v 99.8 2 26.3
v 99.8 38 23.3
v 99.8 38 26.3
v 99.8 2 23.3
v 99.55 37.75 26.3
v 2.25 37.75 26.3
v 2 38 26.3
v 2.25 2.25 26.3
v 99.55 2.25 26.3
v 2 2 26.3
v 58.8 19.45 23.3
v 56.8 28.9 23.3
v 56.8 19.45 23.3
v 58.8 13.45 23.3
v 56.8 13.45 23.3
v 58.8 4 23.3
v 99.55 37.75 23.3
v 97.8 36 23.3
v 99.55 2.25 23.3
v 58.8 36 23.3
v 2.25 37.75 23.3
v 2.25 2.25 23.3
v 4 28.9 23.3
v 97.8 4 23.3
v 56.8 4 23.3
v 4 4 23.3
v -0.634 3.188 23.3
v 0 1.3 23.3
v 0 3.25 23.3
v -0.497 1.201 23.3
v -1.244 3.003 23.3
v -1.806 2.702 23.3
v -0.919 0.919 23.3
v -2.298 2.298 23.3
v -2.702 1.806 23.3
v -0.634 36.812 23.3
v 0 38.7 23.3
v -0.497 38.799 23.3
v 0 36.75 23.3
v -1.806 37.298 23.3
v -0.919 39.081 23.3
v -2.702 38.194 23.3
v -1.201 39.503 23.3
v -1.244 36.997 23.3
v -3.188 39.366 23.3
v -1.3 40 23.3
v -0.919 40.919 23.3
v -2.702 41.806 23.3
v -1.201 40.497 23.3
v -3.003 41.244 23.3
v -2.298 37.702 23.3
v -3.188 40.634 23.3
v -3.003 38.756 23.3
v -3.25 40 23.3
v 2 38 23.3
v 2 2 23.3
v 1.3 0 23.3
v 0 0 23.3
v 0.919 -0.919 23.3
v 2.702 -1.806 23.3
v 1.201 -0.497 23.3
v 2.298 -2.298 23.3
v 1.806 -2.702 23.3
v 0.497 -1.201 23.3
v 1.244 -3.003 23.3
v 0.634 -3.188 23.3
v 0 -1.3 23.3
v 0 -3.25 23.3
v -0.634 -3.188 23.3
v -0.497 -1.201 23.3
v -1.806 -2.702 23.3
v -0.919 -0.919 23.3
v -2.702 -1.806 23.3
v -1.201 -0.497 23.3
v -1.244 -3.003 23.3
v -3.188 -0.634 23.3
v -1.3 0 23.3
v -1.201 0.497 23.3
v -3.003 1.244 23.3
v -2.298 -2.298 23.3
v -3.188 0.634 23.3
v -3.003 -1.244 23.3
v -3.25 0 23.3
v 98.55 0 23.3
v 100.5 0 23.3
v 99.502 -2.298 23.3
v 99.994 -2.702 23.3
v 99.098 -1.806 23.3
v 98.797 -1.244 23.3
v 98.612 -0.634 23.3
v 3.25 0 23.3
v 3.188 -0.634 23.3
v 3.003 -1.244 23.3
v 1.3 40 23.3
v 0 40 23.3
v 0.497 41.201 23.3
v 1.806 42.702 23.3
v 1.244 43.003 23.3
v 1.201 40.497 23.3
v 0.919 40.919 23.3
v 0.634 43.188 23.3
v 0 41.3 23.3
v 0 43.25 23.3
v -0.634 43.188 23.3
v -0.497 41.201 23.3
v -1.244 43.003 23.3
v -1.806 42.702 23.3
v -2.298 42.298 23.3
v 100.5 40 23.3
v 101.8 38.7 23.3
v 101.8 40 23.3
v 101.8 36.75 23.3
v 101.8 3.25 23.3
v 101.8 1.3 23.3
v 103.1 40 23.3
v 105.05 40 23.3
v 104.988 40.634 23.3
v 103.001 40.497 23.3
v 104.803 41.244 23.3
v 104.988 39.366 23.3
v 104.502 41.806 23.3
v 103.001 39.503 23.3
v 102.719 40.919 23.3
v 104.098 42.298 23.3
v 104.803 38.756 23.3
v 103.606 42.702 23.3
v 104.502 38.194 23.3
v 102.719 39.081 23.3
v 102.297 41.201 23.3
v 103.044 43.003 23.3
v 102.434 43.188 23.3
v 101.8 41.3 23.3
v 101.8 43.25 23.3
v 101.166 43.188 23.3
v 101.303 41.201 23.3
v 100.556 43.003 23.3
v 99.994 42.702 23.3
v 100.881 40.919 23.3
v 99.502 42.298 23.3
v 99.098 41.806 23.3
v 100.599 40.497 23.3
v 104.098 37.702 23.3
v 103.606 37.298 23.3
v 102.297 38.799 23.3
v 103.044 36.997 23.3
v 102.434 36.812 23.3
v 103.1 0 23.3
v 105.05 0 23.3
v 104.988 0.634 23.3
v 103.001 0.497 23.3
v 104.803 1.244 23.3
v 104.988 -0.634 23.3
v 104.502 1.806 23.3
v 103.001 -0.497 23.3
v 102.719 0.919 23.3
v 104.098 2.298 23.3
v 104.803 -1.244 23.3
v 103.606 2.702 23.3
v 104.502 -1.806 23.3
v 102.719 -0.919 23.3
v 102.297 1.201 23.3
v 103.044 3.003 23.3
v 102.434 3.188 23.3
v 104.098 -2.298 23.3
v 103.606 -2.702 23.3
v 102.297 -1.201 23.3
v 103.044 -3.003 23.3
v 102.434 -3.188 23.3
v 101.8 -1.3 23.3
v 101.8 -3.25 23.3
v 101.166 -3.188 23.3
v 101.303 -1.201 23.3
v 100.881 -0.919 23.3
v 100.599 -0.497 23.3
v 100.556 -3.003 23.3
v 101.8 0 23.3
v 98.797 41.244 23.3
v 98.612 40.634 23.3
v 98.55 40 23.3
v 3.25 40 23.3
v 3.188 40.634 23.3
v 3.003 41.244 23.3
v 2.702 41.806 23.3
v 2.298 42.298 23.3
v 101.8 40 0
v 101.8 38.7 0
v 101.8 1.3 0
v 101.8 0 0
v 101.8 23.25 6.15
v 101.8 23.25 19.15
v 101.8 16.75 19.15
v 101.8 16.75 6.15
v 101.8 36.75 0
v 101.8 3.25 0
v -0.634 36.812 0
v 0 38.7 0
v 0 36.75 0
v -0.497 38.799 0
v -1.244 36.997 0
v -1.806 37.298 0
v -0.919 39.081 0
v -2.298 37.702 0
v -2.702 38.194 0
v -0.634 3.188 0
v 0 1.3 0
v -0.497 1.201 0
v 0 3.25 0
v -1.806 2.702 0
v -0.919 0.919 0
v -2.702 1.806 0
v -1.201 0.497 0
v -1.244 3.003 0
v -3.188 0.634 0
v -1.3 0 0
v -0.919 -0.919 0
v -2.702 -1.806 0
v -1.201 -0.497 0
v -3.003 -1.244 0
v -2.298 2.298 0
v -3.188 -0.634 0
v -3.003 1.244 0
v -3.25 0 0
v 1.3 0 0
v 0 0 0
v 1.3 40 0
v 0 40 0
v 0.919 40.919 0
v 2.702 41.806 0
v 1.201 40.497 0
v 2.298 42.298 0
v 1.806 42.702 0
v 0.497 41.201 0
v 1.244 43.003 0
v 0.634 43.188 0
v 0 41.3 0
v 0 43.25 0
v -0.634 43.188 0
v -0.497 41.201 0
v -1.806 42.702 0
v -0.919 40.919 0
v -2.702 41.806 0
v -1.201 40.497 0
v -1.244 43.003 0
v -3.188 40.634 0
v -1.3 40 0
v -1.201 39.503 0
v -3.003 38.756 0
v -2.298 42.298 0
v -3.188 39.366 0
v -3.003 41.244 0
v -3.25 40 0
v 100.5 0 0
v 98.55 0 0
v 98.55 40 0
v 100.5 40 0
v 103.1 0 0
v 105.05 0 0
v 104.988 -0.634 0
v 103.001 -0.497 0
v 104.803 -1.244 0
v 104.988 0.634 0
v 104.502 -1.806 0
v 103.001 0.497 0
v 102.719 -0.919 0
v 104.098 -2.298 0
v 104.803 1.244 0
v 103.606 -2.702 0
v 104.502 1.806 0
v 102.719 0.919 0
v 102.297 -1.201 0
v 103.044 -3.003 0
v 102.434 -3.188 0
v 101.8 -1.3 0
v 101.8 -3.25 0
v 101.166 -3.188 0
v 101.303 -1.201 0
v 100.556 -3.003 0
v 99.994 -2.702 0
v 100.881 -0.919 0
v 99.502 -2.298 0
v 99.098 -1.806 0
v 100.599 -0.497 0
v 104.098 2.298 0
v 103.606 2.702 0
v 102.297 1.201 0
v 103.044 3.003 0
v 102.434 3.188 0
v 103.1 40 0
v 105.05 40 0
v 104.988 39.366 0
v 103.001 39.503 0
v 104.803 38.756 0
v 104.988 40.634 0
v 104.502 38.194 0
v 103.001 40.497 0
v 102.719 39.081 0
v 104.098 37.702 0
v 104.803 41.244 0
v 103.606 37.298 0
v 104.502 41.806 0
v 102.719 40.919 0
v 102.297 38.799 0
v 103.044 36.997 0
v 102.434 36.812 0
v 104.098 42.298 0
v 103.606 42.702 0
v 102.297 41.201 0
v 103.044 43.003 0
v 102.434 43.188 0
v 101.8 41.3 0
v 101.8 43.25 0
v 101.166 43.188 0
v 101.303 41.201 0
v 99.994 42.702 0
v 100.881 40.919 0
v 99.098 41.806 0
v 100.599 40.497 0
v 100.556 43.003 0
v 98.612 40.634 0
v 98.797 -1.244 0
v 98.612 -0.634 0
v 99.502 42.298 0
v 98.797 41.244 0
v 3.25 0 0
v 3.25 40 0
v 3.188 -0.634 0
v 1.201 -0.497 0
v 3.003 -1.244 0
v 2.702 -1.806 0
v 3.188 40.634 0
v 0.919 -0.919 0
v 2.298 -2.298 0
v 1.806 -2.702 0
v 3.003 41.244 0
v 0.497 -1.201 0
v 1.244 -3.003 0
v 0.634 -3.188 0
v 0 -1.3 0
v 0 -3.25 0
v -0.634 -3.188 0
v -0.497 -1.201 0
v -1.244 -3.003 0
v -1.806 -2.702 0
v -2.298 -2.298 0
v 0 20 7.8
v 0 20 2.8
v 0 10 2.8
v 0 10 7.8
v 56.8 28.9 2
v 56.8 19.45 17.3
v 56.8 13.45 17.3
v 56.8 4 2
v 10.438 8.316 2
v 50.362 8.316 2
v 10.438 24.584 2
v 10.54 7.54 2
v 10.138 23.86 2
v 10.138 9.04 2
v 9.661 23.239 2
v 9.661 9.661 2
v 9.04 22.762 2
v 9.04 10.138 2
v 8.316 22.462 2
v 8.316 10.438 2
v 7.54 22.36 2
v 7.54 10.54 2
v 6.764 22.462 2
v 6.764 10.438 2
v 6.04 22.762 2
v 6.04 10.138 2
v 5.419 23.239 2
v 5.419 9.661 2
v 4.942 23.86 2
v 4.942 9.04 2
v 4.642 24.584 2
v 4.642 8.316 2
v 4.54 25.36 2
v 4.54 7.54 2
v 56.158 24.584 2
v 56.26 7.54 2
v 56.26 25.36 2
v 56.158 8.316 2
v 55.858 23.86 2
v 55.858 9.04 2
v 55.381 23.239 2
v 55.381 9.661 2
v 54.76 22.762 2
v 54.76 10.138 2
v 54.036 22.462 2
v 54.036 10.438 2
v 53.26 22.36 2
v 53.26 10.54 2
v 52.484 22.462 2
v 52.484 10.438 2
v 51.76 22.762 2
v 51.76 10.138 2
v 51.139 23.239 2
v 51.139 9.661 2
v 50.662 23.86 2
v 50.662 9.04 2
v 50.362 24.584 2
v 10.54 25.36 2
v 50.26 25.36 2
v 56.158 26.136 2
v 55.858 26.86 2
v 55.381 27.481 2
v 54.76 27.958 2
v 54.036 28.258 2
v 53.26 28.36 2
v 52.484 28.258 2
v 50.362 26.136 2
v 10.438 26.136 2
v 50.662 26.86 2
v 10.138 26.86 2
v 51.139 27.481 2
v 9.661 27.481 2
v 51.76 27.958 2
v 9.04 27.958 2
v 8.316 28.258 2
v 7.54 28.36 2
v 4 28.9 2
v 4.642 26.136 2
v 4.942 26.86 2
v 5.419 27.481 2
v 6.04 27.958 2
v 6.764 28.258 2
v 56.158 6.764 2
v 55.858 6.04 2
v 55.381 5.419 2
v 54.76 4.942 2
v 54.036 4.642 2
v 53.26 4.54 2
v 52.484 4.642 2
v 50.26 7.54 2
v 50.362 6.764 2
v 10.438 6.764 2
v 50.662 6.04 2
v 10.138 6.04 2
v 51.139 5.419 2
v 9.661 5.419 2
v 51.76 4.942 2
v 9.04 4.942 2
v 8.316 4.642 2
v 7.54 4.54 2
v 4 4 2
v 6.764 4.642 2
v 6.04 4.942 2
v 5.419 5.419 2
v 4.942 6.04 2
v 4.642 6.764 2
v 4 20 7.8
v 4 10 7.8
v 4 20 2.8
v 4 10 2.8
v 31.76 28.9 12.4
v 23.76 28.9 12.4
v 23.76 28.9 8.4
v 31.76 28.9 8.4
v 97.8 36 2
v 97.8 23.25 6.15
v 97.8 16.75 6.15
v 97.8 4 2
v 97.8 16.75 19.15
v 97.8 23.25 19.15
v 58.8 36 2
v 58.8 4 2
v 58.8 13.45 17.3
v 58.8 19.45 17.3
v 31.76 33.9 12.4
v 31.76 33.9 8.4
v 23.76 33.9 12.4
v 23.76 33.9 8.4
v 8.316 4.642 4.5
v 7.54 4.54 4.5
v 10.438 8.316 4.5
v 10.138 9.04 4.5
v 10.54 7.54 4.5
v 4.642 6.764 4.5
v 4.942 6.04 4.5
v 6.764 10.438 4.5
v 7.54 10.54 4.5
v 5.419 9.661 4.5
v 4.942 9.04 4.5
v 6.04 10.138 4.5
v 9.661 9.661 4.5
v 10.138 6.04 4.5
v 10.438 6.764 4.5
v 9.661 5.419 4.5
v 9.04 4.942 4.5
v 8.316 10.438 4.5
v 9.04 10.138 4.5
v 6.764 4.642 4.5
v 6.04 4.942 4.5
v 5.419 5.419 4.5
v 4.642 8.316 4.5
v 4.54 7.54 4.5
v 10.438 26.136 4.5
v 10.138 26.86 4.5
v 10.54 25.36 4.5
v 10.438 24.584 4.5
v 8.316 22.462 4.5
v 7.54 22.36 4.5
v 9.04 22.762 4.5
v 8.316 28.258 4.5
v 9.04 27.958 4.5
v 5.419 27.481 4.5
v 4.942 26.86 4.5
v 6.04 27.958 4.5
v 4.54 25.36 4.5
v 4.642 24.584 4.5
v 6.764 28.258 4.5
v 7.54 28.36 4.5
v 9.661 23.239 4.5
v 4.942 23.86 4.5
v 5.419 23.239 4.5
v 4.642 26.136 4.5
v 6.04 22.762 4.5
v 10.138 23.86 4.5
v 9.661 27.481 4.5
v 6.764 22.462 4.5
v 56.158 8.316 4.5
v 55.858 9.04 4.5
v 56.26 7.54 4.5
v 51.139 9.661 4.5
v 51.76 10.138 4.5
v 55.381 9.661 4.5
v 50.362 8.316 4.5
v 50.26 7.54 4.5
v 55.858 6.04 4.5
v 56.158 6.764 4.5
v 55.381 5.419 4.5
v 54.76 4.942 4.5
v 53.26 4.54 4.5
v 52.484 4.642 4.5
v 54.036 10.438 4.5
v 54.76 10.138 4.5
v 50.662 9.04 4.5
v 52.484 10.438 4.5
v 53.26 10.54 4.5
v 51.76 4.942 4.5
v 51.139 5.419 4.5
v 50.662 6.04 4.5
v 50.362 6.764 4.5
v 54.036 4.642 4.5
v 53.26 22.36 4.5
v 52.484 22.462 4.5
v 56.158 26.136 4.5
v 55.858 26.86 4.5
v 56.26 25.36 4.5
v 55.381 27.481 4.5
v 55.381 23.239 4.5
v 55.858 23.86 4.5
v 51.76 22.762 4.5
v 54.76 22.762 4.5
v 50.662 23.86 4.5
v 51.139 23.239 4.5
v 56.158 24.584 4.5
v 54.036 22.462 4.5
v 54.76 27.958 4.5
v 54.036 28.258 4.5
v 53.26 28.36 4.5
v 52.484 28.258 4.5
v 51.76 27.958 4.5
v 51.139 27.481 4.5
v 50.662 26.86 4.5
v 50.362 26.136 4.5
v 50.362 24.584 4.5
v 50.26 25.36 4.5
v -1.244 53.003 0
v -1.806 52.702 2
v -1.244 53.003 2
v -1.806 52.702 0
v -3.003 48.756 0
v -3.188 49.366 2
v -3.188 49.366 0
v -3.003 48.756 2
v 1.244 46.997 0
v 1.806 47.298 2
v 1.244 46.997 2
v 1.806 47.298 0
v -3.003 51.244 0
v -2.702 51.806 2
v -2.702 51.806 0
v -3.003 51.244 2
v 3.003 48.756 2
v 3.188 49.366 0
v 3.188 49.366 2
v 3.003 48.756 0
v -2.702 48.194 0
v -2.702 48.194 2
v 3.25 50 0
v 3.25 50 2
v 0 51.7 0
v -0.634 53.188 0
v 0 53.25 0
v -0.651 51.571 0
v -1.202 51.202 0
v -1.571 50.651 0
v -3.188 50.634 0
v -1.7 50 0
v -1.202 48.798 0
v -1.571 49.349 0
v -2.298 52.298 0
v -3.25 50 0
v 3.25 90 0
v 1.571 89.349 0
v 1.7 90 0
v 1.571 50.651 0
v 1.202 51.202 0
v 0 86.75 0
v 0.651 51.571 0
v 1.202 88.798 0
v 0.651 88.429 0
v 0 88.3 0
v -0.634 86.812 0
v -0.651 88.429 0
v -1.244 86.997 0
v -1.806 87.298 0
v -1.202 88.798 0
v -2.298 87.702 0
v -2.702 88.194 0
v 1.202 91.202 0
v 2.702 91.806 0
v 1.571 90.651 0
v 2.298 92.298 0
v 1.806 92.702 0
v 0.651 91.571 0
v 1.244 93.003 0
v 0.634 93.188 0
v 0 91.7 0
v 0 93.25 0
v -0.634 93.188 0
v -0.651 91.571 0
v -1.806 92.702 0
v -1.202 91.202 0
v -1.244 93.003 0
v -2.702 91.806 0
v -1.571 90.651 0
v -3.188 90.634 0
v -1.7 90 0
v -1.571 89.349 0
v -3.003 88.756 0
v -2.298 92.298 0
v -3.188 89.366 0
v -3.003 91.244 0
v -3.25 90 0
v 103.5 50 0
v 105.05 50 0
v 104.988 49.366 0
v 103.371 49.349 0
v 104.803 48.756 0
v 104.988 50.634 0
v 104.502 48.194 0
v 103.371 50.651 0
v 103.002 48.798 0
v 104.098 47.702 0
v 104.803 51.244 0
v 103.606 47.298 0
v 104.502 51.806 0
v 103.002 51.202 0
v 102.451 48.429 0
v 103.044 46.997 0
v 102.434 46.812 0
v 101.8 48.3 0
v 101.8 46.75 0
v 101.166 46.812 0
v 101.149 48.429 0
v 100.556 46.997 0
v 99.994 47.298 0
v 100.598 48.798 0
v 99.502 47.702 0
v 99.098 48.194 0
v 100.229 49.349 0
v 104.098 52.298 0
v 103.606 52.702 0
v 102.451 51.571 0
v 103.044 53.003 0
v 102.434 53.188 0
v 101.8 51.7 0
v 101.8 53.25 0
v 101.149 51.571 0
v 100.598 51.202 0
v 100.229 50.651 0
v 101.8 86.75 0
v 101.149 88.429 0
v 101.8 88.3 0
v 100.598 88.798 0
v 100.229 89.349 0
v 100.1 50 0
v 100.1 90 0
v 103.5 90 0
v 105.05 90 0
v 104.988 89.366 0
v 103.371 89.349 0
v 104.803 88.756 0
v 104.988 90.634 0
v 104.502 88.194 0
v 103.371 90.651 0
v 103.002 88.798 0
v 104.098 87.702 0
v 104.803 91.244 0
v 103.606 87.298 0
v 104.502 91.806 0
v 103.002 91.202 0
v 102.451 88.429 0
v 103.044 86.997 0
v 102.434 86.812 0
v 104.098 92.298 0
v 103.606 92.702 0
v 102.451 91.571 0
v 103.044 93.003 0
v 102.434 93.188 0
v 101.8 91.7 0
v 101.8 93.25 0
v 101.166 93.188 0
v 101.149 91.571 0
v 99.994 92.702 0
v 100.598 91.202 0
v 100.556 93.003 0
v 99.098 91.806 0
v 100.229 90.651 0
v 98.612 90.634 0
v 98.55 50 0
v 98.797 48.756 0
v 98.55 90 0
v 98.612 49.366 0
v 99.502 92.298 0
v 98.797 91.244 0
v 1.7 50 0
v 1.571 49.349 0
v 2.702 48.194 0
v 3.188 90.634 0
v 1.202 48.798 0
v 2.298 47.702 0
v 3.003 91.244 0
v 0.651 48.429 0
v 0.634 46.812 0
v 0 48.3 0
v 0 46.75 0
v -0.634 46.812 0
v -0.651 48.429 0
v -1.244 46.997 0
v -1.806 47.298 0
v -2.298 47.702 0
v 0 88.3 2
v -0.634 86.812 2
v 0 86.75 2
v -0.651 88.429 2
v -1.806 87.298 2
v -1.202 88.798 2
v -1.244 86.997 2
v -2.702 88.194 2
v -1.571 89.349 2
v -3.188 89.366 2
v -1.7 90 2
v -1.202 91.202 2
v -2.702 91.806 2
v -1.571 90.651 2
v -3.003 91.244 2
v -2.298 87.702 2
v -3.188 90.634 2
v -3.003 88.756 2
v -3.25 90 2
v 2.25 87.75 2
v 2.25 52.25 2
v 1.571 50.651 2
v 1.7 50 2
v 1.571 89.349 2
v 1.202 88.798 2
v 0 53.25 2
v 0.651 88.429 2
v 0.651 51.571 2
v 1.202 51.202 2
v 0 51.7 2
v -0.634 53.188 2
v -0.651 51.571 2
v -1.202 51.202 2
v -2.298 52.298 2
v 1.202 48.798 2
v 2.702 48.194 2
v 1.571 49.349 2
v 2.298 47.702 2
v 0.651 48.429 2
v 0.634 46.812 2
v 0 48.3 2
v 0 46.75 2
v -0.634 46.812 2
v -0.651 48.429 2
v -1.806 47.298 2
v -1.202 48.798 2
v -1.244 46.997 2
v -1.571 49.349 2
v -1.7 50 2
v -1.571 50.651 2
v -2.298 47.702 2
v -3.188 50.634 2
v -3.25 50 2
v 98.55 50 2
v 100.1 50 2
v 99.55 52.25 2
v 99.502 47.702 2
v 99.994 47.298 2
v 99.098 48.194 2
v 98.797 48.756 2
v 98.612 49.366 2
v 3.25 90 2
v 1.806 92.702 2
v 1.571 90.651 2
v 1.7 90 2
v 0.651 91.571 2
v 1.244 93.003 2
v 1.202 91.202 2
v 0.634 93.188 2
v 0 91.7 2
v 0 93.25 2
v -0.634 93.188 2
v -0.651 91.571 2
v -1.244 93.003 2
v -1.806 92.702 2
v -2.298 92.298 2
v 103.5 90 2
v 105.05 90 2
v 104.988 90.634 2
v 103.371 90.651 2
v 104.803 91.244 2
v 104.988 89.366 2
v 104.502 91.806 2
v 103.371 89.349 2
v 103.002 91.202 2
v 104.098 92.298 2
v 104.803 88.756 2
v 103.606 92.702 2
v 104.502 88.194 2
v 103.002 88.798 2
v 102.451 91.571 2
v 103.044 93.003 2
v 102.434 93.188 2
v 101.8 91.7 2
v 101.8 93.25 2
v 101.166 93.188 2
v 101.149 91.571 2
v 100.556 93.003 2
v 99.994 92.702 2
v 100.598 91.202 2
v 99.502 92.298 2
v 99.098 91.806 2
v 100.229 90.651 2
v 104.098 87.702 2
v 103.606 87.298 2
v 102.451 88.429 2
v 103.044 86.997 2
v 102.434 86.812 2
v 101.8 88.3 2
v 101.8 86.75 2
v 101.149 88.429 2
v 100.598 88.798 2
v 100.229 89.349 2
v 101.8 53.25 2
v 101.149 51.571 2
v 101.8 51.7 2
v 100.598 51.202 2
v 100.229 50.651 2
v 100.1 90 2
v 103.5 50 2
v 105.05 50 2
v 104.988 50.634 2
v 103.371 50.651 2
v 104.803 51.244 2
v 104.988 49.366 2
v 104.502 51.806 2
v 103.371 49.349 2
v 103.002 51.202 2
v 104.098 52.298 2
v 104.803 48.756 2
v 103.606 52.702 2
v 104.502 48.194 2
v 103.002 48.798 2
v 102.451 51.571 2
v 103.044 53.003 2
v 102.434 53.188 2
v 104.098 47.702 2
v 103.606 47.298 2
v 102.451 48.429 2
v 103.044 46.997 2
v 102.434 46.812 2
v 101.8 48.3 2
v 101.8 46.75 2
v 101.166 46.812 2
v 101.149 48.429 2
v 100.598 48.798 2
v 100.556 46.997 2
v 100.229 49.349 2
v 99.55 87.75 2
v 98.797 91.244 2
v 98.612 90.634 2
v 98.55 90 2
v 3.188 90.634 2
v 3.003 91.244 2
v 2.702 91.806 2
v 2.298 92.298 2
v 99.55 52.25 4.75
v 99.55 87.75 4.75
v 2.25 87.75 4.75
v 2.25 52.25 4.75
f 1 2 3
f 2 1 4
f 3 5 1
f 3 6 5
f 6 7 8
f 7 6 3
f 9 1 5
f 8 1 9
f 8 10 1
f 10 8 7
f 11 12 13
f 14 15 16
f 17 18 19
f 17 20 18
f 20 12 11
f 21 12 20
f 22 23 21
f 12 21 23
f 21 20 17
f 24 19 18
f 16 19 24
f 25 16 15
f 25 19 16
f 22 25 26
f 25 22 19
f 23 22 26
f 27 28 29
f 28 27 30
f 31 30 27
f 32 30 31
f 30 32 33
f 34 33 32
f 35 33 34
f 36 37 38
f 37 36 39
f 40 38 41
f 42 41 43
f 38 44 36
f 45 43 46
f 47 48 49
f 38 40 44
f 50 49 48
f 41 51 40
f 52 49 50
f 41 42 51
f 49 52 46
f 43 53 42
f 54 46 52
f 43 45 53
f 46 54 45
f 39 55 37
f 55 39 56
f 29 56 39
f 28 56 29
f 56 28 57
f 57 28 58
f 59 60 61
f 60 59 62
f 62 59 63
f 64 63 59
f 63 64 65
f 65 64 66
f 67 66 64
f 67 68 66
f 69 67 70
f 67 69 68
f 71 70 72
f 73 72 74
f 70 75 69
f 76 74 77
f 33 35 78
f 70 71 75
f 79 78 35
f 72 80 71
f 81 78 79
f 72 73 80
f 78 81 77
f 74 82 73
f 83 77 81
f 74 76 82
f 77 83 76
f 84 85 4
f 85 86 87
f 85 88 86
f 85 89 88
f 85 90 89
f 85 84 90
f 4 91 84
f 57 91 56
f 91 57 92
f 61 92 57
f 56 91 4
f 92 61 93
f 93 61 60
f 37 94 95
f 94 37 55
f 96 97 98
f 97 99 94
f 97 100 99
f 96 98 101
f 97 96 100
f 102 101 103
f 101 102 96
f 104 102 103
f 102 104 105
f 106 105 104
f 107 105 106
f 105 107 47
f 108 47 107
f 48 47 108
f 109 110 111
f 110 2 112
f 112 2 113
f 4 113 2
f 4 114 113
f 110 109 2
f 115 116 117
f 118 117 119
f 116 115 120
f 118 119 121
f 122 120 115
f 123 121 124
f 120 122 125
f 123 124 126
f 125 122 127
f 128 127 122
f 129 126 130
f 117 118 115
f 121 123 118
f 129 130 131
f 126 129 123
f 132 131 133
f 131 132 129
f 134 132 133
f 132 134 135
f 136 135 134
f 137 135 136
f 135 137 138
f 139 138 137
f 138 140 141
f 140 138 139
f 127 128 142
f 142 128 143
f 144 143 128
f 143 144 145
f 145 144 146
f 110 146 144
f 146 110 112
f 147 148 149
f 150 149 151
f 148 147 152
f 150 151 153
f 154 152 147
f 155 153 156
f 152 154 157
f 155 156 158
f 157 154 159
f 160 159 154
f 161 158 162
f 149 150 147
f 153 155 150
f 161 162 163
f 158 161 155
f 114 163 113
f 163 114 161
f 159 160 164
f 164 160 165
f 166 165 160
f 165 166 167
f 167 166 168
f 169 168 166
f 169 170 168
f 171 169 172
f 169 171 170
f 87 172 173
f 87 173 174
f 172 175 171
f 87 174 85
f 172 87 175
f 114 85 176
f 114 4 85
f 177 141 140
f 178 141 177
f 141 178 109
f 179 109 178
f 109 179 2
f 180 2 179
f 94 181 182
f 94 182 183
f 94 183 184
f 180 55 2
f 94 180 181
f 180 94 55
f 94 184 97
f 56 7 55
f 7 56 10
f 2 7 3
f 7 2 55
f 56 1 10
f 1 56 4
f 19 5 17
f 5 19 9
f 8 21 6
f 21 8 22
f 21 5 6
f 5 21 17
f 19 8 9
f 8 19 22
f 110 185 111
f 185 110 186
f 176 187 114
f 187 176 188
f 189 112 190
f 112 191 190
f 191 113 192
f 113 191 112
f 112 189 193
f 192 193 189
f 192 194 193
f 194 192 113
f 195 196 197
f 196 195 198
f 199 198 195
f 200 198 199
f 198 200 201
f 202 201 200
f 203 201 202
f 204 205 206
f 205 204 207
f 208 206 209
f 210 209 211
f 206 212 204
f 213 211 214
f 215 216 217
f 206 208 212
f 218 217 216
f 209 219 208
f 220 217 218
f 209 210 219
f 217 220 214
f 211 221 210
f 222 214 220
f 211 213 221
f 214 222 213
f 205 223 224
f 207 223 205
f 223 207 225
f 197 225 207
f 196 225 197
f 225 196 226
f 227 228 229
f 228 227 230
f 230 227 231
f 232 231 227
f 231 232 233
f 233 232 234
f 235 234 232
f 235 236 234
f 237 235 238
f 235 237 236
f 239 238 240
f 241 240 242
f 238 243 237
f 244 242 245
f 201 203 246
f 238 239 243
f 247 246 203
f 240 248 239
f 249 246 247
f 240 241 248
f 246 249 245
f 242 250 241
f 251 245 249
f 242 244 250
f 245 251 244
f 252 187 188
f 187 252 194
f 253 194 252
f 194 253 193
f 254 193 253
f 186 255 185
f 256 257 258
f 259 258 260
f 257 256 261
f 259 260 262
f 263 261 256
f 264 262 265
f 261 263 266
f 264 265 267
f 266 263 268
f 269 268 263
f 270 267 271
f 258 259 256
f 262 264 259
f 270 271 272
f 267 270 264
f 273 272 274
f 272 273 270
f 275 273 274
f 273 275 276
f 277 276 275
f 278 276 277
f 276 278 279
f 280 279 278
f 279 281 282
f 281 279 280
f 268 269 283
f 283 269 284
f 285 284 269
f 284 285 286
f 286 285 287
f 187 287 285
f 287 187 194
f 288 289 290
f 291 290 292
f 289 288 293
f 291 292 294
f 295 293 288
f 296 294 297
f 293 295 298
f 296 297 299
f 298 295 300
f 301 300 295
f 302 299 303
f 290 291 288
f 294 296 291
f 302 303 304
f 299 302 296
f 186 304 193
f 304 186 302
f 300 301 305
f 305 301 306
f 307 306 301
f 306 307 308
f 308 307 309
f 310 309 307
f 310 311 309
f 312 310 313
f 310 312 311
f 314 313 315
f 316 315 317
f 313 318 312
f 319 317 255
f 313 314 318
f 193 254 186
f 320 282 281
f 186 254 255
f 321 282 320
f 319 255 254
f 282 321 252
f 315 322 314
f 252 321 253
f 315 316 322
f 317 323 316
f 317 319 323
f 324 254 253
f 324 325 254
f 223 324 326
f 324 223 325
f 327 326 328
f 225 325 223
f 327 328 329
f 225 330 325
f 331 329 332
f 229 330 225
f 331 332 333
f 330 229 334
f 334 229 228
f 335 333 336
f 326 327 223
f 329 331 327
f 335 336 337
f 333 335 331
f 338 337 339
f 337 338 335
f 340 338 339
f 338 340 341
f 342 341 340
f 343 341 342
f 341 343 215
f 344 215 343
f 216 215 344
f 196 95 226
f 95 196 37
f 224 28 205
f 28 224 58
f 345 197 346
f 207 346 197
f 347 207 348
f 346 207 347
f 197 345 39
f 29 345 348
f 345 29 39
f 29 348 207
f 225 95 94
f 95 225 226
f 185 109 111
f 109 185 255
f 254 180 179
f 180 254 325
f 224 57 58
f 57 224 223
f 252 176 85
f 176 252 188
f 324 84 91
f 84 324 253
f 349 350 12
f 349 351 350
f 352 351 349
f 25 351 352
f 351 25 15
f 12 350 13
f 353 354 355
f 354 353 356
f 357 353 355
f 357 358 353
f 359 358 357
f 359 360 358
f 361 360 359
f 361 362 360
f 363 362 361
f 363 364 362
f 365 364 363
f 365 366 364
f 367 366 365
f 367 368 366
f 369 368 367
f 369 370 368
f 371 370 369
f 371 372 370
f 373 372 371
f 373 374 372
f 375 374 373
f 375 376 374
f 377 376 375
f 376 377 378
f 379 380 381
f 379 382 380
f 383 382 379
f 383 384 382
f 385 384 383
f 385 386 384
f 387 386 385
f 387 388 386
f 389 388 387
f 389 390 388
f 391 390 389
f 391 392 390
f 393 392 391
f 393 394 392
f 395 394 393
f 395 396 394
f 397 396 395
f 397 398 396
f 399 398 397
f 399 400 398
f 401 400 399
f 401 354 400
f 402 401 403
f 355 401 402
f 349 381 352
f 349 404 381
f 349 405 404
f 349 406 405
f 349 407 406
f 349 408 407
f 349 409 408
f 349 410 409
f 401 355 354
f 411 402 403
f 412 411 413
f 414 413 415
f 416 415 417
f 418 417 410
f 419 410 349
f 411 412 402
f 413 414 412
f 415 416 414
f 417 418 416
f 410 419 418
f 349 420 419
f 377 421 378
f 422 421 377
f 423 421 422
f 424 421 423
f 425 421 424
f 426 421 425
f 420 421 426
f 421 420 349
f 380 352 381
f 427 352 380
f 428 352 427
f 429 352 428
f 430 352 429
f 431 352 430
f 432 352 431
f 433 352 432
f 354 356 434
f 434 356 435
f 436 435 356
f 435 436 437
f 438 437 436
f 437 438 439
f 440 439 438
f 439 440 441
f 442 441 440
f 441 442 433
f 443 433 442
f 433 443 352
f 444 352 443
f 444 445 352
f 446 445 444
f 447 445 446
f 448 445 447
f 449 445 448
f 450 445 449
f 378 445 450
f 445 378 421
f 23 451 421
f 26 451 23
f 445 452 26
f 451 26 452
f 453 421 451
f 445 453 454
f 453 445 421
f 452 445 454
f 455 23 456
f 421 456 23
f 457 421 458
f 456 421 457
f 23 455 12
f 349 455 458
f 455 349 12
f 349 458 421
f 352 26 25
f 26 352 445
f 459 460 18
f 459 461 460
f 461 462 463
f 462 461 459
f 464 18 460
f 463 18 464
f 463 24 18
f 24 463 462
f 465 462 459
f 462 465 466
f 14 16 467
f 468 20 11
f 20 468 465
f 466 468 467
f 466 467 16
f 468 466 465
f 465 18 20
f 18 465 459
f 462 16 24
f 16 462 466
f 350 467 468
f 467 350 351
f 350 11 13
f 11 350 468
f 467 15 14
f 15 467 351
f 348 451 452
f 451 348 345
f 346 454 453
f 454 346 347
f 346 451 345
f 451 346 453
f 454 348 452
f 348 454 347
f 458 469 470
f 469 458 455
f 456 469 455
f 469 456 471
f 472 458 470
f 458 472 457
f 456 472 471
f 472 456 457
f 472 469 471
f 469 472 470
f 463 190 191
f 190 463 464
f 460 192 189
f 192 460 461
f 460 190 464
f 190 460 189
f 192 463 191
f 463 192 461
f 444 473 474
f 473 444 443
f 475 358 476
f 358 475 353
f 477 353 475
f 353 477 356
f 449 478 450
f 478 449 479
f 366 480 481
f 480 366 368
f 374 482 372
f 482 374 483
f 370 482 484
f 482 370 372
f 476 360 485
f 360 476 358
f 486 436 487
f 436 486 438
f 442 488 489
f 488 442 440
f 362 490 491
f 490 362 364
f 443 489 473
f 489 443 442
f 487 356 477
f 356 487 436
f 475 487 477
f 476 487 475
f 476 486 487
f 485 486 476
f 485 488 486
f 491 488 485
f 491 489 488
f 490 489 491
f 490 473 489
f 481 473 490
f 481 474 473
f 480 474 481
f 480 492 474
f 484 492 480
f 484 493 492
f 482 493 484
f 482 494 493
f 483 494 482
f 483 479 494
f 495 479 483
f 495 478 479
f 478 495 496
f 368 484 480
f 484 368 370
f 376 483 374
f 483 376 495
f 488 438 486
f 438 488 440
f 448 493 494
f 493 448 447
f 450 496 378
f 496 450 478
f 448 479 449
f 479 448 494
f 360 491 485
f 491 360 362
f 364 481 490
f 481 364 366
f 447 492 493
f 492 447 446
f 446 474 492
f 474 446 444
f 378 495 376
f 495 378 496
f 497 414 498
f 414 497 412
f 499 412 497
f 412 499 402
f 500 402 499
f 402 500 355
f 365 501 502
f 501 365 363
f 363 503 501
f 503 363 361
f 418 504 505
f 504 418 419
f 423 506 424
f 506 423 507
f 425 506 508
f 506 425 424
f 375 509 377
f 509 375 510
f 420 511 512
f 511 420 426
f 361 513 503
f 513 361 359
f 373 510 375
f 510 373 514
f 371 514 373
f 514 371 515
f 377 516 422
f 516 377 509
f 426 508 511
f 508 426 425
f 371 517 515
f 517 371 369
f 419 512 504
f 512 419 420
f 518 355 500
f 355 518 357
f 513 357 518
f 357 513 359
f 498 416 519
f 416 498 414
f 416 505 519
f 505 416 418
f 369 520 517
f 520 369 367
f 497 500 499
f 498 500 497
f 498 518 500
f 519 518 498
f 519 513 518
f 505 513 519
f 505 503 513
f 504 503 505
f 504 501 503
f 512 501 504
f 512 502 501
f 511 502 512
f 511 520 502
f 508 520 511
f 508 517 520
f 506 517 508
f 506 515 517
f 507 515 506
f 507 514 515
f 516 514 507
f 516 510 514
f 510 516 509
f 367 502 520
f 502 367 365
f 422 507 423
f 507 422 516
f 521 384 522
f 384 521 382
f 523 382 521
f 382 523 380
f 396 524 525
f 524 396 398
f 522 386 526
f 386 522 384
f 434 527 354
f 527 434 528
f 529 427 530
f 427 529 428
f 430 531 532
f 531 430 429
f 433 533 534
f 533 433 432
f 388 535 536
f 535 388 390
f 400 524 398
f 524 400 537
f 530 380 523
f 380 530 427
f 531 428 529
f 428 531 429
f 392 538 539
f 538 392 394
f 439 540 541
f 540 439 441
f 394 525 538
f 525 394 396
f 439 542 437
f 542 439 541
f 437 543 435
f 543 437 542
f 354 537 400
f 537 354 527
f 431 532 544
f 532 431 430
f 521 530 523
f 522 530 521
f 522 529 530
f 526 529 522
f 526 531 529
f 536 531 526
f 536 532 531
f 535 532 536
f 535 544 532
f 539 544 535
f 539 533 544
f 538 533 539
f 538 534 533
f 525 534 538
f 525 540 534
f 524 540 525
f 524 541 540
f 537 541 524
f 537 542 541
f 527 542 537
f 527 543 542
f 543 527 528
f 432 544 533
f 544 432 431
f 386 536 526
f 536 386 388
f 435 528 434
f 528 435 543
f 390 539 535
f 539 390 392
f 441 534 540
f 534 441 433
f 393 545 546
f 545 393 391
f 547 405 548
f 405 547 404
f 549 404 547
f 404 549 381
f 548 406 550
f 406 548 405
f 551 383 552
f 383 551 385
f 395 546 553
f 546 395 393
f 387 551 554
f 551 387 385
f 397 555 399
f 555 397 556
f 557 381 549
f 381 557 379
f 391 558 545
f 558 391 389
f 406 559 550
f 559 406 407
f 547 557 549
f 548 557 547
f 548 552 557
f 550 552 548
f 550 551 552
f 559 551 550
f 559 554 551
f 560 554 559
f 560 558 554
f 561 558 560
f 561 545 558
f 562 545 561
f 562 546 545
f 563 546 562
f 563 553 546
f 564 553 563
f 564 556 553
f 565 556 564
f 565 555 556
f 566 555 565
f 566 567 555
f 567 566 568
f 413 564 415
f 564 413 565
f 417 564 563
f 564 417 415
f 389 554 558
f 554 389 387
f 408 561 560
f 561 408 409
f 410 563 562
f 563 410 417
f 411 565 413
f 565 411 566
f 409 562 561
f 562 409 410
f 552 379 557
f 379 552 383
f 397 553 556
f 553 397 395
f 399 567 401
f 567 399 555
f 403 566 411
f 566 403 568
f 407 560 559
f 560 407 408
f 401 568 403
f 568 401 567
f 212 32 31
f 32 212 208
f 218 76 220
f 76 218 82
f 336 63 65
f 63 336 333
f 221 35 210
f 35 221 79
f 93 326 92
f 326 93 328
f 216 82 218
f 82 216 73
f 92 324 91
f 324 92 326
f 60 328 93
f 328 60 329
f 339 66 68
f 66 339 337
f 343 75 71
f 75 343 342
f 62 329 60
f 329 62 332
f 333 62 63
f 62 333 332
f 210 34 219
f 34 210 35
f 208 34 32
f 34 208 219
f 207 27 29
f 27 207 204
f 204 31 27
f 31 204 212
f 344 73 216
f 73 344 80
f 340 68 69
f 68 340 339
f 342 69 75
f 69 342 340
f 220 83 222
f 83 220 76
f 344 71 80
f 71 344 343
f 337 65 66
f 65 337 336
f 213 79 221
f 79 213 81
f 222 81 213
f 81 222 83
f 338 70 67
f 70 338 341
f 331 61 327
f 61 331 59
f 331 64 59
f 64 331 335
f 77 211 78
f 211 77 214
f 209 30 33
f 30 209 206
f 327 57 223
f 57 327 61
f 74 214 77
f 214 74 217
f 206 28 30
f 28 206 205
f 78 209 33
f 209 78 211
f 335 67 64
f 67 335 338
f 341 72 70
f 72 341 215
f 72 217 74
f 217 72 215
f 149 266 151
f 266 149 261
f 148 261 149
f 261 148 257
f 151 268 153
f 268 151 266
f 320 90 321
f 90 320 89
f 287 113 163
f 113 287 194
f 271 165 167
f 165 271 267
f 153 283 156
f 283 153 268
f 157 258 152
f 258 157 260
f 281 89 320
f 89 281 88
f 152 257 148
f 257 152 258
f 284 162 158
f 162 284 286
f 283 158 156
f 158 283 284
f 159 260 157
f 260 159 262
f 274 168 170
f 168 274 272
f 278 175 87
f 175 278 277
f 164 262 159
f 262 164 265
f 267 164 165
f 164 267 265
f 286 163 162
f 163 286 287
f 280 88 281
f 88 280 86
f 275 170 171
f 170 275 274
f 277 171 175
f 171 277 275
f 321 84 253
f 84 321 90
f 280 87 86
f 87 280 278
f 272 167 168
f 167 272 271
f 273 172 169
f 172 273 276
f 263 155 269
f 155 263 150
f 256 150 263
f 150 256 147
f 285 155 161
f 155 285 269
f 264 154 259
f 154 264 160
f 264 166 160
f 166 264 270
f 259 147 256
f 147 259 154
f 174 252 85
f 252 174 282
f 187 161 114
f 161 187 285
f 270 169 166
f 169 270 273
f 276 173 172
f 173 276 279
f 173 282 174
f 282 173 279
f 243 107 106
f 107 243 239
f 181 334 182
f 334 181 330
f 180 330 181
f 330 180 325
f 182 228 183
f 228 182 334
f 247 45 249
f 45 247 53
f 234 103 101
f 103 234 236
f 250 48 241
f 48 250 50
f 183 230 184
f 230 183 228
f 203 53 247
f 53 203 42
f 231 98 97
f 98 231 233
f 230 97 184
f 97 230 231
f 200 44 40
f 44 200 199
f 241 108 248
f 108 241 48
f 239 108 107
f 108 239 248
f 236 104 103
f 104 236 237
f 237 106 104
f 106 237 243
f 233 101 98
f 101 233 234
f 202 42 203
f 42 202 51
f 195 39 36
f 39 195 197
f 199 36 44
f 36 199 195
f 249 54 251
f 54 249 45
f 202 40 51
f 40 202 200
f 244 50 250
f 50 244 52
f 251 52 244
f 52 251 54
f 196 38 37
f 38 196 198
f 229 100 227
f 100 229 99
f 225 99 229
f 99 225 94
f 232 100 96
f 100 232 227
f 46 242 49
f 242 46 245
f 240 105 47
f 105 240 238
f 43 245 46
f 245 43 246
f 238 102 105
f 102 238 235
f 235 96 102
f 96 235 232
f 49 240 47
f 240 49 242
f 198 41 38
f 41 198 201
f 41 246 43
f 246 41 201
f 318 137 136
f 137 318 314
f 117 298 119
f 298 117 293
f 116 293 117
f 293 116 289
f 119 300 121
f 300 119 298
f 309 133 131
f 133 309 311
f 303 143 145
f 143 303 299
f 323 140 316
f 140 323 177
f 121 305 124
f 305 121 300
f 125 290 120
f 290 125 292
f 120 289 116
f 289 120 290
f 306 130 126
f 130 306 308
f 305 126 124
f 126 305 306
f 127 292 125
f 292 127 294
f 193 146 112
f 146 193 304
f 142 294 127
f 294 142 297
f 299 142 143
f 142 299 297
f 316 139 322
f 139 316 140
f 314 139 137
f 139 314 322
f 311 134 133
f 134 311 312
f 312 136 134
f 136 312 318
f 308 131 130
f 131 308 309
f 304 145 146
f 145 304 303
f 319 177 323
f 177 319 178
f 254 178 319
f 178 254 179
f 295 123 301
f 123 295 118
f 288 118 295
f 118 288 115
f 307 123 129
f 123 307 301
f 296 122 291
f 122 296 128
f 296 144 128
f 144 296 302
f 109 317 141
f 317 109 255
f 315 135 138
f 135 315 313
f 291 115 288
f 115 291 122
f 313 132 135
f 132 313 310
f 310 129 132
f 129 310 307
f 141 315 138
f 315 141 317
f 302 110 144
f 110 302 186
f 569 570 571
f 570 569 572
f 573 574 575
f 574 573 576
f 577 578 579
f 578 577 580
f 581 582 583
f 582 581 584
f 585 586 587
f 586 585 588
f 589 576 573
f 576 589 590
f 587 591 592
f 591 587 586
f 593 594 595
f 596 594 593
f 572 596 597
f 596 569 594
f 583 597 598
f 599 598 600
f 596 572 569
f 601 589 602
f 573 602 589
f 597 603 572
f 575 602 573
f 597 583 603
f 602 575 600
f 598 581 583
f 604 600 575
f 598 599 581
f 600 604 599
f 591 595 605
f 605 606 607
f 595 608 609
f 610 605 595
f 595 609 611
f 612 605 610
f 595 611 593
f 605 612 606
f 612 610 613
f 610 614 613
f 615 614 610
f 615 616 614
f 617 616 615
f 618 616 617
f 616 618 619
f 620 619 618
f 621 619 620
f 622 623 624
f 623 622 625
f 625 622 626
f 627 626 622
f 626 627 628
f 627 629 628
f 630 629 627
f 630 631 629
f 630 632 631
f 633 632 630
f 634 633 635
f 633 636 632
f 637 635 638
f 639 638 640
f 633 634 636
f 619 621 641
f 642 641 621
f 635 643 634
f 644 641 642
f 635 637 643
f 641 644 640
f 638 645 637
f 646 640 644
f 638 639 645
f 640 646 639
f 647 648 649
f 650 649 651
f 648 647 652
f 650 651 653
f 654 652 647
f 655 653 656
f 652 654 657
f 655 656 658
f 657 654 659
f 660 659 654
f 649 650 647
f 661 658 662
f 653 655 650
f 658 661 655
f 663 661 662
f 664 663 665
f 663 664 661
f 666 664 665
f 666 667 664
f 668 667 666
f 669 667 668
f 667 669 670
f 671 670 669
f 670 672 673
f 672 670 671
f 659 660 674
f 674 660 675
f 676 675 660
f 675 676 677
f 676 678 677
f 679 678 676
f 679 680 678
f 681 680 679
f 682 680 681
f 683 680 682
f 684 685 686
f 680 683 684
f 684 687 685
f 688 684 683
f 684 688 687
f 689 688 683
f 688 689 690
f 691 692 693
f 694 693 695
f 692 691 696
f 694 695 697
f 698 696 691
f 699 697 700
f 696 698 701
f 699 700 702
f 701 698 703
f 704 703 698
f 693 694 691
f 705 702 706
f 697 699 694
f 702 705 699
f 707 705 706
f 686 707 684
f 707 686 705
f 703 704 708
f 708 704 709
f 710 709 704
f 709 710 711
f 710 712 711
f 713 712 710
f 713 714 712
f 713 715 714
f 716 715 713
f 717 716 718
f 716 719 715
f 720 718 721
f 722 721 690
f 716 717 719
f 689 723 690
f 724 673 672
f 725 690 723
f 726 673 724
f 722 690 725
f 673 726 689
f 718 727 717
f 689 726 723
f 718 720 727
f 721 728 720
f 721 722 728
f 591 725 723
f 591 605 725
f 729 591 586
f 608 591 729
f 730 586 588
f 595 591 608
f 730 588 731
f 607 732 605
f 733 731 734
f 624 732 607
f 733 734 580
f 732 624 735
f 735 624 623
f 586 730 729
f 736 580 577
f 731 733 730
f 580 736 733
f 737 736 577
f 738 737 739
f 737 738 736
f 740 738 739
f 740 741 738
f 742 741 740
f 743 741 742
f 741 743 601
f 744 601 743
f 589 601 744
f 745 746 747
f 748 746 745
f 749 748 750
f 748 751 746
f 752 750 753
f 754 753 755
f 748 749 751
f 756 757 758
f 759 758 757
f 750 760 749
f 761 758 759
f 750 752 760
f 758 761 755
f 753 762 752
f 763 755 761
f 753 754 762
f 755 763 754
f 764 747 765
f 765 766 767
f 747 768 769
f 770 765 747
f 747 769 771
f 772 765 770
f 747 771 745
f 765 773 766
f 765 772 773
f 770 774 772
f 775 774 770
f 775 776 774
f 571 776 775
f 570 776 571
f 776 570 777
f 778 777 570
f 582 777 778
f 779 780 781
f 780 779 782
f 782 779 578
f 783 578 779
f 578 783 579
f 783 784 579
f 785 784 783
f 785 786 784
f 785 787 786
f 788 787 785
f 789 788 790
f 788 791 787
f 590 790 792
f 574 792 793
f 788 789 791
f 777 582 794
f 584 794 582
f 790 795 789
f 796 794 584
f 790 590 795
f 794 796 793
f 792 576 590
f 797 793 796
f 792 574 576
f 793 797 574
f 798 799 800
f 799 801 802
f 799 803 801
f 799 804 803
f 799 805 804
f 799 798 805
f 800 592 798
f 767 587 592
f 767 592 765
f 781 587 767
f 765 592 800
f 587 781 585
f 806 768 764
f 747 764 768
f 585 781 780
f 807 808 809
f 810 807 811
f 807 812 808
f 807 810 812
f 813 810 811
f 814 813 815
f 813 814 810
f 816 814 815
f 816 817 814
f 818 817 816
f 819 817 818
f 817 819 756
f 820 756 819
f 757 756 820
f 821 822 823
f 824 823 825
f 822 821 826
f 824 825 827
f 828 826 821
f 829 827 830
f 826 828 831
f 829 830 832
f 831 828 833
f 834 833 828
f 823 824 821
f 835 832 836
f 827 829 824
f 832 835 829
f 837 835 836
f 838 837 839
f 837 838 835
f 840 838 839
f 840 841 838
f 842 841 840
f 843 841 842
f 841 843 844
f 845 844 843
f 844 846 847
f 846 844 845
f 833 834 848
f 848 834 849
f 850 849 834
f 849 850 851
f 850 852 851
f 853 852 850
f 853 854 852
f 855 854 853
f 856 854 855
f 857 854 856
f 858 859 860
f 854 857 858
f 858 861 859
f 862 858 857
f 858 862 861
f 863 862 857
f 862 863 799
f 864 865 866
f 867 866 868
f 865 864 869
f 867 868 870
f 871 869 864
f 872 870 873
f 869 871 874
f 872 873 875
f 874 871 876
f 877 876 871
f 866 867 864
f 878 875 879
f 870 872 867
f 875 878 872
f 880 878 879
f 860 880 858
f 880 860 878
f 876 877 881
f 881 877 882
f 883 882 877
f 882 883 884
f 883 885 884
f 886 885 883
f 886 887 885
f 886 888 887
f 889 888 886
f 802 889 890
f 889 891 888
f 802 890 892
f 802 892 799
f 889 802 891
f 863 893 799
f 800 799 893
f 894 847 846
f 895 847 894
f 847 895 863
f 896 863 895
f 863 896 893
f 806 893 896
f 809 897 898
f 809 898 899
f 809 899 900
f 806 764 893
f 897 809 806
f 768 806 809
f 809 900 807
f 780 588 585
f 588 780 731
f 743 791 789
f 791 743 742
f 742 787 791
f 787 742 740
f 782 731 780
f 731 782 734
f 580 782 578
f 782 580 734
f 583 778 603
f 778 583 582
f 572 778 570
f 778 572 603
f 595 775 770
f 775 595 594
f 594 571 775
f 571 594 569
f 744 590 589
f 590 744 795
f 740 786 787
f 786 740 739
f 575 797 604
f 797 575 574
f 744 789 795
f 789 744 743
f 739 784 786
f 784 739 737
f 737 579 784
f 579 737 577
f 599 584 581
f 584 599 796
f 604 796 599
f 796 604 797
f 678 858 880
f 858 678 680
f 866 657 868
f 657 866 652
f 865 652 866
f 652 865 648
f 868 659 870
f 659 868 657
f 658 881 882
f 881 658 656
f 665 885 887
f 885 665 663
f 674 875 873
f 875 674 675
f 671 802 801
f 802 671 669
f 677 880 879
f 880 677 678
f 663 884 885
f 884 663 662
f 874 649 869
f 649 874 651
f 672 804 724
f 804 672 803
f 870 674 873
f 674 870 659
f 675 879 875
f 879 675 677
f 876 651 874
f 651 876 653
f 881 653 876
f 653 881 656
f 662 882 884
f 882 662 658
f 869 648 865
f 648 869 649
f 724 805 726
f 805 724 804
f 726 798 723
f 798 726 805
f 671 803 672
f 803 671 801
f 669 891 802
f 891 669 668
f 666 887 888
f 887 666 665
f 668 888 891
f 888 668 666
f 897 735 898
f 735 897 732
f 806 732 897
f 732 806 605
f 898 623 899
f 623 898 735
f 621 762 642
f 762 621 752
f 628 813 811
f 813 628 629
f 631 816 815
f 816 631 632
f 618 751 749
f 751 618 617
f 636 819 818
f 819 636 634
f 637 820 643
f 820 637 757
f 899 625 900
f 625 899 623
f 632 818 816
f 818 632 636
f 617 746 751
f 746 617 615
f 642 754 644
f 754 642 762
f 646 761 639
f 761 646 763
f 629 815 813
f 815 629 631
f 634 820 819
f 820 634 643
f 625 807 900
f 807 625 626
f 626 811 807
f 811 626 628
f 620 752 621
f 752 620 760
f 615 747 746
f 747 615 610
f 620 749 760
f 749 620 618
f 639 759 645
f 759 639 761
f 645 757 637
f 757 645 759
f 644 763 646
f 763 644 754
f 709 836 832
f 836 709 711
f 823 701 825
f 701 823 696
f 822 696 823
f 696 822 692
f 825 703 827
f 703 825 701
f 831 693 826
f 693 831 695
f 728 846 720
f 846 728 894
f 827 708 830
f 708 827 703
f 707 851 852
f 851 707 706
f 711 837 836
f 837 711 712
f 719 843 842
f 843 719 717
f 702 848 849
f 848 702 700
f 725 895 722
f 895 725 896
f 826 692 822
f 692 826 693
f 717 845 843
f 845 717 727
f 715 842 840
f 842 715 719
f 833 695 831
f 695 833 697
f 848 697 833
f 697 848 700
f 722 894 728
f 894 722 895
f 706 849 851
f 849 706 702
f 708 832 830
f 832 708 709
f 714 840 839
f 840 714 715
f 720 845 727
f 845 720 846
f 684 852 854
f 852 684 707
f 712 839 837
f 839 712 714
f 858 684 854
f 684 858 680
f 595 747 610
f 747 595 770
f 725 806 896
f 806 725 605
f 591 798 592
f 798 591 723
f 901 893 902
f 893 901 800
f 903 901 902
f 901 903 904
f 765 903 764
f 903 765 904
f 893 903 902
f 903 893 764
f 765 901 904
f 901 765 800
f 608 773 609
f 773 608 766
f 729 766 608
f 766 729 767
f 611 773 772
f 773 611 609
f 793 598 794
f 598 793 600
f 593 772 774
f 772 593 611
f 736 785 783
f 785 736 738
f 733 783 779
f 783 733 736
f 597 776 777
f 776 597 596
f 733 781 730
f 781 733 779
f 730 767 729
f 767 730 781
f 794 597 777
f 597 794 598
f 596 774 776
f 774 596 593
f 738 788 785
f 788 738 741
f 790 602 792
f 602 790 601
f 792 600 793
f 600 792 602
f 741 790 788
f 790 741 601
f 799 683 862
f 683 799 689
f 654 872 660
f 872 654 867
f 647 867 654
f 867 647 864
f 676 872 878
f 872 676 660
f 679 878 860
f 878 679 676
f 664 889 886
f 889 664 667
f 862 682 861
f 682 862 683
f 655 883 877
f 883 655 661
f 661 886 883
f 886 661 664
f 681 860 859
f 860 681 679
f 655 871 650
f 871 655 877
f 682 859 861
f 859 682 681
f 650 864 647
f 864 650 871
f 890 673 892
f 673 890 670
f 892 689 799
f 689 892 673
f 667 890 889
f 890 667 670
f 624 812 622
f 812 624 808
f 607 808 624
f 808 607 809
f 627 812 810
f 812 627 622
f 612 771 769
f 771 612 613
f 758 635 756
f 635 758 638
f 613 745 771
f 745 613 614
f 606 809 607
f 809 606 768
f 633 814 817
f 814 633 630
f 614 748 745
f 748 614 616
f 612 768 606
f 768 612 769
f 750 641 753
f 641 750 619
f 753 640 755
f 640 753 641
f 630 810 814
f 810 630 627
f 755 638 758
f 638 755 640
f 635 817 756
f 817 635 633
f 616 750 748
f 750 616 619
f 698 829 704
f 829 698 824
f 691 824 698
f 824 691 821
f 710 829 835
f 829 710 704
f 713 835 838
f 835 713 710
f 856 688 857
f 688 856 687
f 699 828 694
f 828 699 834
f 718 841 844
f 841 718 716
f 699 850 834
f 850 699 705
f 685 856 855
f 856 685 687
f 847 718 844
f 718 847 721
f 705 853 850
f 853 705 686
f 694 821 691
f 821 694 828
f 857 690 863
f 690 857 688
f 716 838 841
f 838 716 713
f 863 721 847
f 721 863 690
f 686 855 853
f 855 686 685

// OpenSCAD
// ==========================================================================
// ROCKET TRACKER - TRANSMITTER CASE
// ==========================================================================
// Holds: Adafruit Feather M0 w/ RFM95 LoRa (900MHz, product 3178) with the
// Adafruit Ultimate GPS FeatherWing (product 3133) stacked on top, a 3.7V
// 500mAh LiPo (product 1578), room for a spring/wire antenna to exit the
// case, and a panel-mount cutout for an inline power switch spliced into
// the battery lead.
//
// HOW TO USE THIS FILE
//   1. Open in OpenSCAD (openscad.org - free, all platforms).
//   2. Set the `part` variable below to "base" or "lid", press F6 (render),
//      then File > Export > Export as STL. Do this once for each part.
//   3. Leaving `part` set to "both" just previews them side by side so you
//      can see how everything lines up - don't export an STL in that mode,
//      the two parts would come out as one fused blob.
//
// IMPORTANT - DIMENSIONS ARE BEST-EFFORT, NOT MEASURED FROM YOUR HARDWARE
//   Board outline, header spacing, and connector positions below come from
//   Adafruit's published Feather specification and product pages, not from
//   calipers on your actual boards. The pocket and cutouts are sized with
//   generous clearance (see the *_fit variables) specifically so small
//   errors here don't turn into a part that doesn't fit. Even so: print the
//   base first, test-fit your actual boards and battery in it BEFORE
//   printing the lid or trimming any clearance down. Cheap, fast filament
//   (low infill, no supports needed for this design) makes a test print
//   painless compared to re-measuring everything by hand up front.
//
// WHERE THE ANTENNA EXITS
//   Adafruit's guide has you solder the antenna into the "ANT" pad on the
//   right-hand edge of the Feather (USB connector oriented at the top).
//   `ant_slot_y` below controls how far down that edge the exit slot is
//   cut - the default is a rough middle-of-the-edge guess. Check where
//   your antenna is actually soldered before printing and nudge that
//   number to match; the slot is intentionally a bit oversized so small
//   misses still work.
// ==========================================================================

part = "both"; // "base", "lid", or "both" (preview only)

// ---------------------------------------------------------------------
// Feather board stack (M0 LoRa + GPS FeatherWing)
// ---------------------------------------------------------------------
feather_l          = 50.8;  // 2.0in - Feather board length (Adafruit spec)
feather_w          = 22.9;  // 0.9in - Feather board width
board_fit          = 1.0;   // clearance added around the board footprint
pcb_t              = 1.6;   // typical PCB thickness (both boards)
header_gap         = 8.6;   // vertical gap between the two boards once the
                             // GPS wing is plugged into standard-height
                             // female headers on the M0 - also has to fit
                             // the GPS wing's coin-cell holder on its
                             // underside, which is why this isn't tighter
under_board_clear  = 2.5;   // clearance below the M0 for solder joints/pins
top_stack_clear    = 7.0;   // clearance above the GPS wing for its patch
                             // antenna (~4mm tall) plus a little headroom

stack_h = under_board_clear + pcb_t + header_gap + pcb_t + top_stack_clear;

// Feather mounting holes: Adafruit's spec says "0.1in holes at each
// corner" - taken here as 2.54mm inset from every edge, giving the
// commonly-seen 1.8in x 0.7in (45.7 x 17.8mm) hole spacing. Worth
// double-checking against your actual board; these posts are support/
// registration features, not the only thing holding the stack in place.
hole_inset  = 2.54;
post_dia    = 6.0;   // support nub diameter at each estimated hole location
                      // (solid bumps the PCB rests on - not threaded, just
                      // support; add your own screw holes here if you've
                      // verified the real hole positions on your board)

// ---------------------------------------------------------------------
// Battery bay (Adafruit 1578, 3.7V 500mAh)
// ---------------------------------------------------------------------
batt_l = 36.0;
batt_w = 29.0;
batt_t = 4.75;
batt_fit = 1.5; // clearance around the battery so it slides in easily

// ---------------------------------------------------------------------
// Case shell
// ---------------------------------------------------------------------
wall   = 4.0;   // thicker than a typical enclosure on purpose - this also
                 // needs to survive a parachute landing, and the corner
                 // mounting ears below need enough wall to sit in without
                 // poking into either pocket (see ear_d comment)
floor  = 2.0;
lid_t  = 2.0;
lip_h  = 3.0;   // depth of the base's lip that the lid seats into
lip_gap = 0.25; // printer-dependent slop between lid lip and base lip

// Corner mounting ears (screw the lid to the base with 4x M3 self-tapping
// screws). Centered exactly on the case's 4 outer corners so half the
// cylinder is an "ear" sticking out and half is structurally fused into
// the case wall - ear_d's radius is kept smaller than `wall` so it can't
// poke into either pocket.
ear_d       = 6.5;
ear_pilot_d = 2.6; // pilot hole in the base (self-tapping M3)
ear_clear_d = 3.4; // clearance hole in the lid (screw passes through)

// Internal partition between the electronics bay and the battery bay -
// the battery's JST wire just runs over the top of it, no hole needed.
divider_w = 2.0;
divider_gap_h = 6.0; // leave a gap above the divider for the JST wire

// ---------------------------------------------------------------------
// USB cutout (micro USB on the Feather M0, top/short edge of the board)
// ---------------------------------------------------------------------
usb_w = 10.0;
usb_h = 5.0;
usb_offset = 6.0; // distance from the electronics-bay side wall to the
                   // near edge of the cutout - Feather's USB connector
                   // sits close to the left edge of the board; nudge this
                   // to match your board if it's off

// ---------------------------------------------------------------------
// Antenna exit slot (right-hand edge of the Feather, per Adafruit's guide)
// ---------------------------------------------------------------------
ant_slot_w = 8.0;
ant_slot_h = 4.0;
ant_slot_y = 0.45; // fraction along that edge's length - 0 = USB end,
                    // 1 = far end. 0.45 is a rough "somewhere in the
                    // middle" guess - adjust to match your board.

// ---------------------------------------------------------------------
// Inline power switch cutout (panel-mount slide switch spliced into the
// battery's JST lead, e.g. a small SPDT slide switch - adjust sw_l/sw_w
// to whatever you actually bought; a mini round toggle switch also works
// if you swap the cutout() module below for a circle())
// ---------------------------------------------------------------------
sw_l = 13.0;
sw_w = 6.5;
sw_wall_offset = 10.0; // distance from the battery bay's outer end wall

// ==========================================================================
// Derived layout
// ==========================================================================
elec_pocket_l = feather_l + board_fit * 2;
elec_pocket_w = feather_w + board_fit * 2;
// elec_bay_l is the X coordinate where the divider wall starts - just the
// near-side outer wall plus the electronics pocket. The divider itself
// (below) is the ONLY wall between the two bays; there's no separate,
// redundant far wall for the electronics bay.
elec_bay_l    = wall + elec_pocket_l;

batt_pocket_l = batt_l + batt_fit * 2;
batt_pocket_w = batt_w + batt_fit * 2;
batt_bay_l    = batt_pocket_l + wall; // battery pocket + its own far wall

case_l = elec_bay_l + divider_w + batt_bay_l;
case_w = max(elec_pocket_w, batt_pocket_w) + wall * 2;
case_h = floor + max(stack_h, batt_t + batt_fit) + lip_h;

// vertical center for the inline-switch cutout, within the usable internal
// height (below the lid's seating lip)
sw_z0 = floor + (case_h - lip_h - floor - sw_l) / 2;

echo(str("Case outer footprint: ", case_l, " x ", case_w, " x ", case_h, " mm"));

// ==========================================================================
// Base
// ==========================================================================
module base() {
  difference() {
    union() {
      // outer shell
      cube([case_l, case_w, case_h - lip_h]);
      // lip that the lid seats onto
      difference() {
        translate([wall/2, wall/2, case_h - lip_h])
          cube([case_l - wall, case_w - wall, lip_h]);
        translate([wall/2 + lip_gap, wall/2 + lip_gap, case_h - lip_h])
          cube([case_l - wall - lip_gap*2, case_w - wall - lip_gap*2, lip_h + 1]);
      }
    }

    // hollow out electronics bay
    translate([wall, wall, floor])
      cube([elec_pocket_l, elec_pocket_w, case_h]);

    // hollow out battery bay
    translate([elec_bay_l + divider_w, wall, floor])
      cube([batt_pocket_l, batt_pocket_w, case_h]);

    // notch above the divider for the battery's JST wire to cross over
    translate([elec_bay_l, wall + elec_pocket_w/2 - 3, floor + stack_h - divider_gap_h])
      cube([divider_w, 6, divider_gap_h + 1]);

    // USB cutout, centered vertically on the M0 board's expected height
    translate([-1, wall + usb_offset, floor + under_board_clear + pcb_t/2 - usb_h/2])
      cube([wall + 2, usb_w, usb_h]);

    // antenna exit slot on the "right" long edge of the electronics bay
    translate([wall + elec_pocket_l * ant_slot_y - ant_slot_w/2,
               wall + elec_pocket_w - 1,
               floor + under_board_clear + pcb_t + header_gap/2 - ant_slot_h/2])
      cube([ant_slot_w, wall + 2, ant_slot_h]);

    // inline switch cutout on the battery bay's outer end (far) wall -
    // straight through-cut, no need to rotate since this wall already
    // faces along X
    translate([case_l - wall - 1,
               wall + (batt_pocket_w - sw_w) / 2,
               sw_z0])
      cube([wall + 2, sw_w, sw_l]);
  }

  // support posts under the electronics-bay corners, roughly matching
  // the Feather's mounting-hole spacing (see hole_inset comment above)
  for (x = [hole_inset, feather_l - hole_inset])
    for (y = [hole_inset, feather_w - hole_inset])
      translate([wall + board_fit + x, wall + board_fit + y, floor])
        cylinder(d = post_dia, h = under_board_clear, $fn = 24);

  // corner mounting ears with a self-tapping screw pilot hole, spanning
  // the full height of the base shell (up to where the lid's lip seats)
  for (c = [[0, 0], [case_l, 0], [0, case_w], [case_l, case_w]])
    translate([c[0], c[1], 0])
      difference() {
        cylinder(d = ear_d, h = case_h - lip_h, $fn = 32);
        translate([0, 0, -1]) cylinder(d = ear_pilot_d, h = case_h - lip_h + 2, $fn = 16);
      }
}

// ==========================================================================
// Lid
// ==========================================================================
module lid() {
  difference() {
    union() {
      cube([case_l, case_w, lid_t]);
      // skirt that overlaps the base's lip
      translate([wall/2 + lip_gap, wall/2 + lip_gap, lid_t])
        cube([case_l - wall - lip_gap*2, case_w - wall - lip_gap*2, lip_h - lip_gap]);
      // corner ears matching the base's, so the screw heads have somewhere
      // flat to sit
      for (c = [[0, 0], [case_l, 0], [0, case_w], [case_l, case_w]])
        translate([c[0], c[1], 0])
          cylinder(d = ear_d, h = lid_t, $fn = 32);
    }
    // screw clearance holes matching the base's pilot holes
    for (c = [[0, 0], [case_l, 0], [0, case_w], [case_l, case_w]])
      translate([c[0], c[1], -1])
        cylinder(d = ear_clear_d, h = lid_t + 2, $fn = 16);
  }
}

// ==========================================================================
// Render selection
// ==========================================================================
if (part == "base") {
  base();
} else if (part == "lid") {
  lid();
} else {
  base();
  translate([0, case_w + 10, 0]) lid();
}
